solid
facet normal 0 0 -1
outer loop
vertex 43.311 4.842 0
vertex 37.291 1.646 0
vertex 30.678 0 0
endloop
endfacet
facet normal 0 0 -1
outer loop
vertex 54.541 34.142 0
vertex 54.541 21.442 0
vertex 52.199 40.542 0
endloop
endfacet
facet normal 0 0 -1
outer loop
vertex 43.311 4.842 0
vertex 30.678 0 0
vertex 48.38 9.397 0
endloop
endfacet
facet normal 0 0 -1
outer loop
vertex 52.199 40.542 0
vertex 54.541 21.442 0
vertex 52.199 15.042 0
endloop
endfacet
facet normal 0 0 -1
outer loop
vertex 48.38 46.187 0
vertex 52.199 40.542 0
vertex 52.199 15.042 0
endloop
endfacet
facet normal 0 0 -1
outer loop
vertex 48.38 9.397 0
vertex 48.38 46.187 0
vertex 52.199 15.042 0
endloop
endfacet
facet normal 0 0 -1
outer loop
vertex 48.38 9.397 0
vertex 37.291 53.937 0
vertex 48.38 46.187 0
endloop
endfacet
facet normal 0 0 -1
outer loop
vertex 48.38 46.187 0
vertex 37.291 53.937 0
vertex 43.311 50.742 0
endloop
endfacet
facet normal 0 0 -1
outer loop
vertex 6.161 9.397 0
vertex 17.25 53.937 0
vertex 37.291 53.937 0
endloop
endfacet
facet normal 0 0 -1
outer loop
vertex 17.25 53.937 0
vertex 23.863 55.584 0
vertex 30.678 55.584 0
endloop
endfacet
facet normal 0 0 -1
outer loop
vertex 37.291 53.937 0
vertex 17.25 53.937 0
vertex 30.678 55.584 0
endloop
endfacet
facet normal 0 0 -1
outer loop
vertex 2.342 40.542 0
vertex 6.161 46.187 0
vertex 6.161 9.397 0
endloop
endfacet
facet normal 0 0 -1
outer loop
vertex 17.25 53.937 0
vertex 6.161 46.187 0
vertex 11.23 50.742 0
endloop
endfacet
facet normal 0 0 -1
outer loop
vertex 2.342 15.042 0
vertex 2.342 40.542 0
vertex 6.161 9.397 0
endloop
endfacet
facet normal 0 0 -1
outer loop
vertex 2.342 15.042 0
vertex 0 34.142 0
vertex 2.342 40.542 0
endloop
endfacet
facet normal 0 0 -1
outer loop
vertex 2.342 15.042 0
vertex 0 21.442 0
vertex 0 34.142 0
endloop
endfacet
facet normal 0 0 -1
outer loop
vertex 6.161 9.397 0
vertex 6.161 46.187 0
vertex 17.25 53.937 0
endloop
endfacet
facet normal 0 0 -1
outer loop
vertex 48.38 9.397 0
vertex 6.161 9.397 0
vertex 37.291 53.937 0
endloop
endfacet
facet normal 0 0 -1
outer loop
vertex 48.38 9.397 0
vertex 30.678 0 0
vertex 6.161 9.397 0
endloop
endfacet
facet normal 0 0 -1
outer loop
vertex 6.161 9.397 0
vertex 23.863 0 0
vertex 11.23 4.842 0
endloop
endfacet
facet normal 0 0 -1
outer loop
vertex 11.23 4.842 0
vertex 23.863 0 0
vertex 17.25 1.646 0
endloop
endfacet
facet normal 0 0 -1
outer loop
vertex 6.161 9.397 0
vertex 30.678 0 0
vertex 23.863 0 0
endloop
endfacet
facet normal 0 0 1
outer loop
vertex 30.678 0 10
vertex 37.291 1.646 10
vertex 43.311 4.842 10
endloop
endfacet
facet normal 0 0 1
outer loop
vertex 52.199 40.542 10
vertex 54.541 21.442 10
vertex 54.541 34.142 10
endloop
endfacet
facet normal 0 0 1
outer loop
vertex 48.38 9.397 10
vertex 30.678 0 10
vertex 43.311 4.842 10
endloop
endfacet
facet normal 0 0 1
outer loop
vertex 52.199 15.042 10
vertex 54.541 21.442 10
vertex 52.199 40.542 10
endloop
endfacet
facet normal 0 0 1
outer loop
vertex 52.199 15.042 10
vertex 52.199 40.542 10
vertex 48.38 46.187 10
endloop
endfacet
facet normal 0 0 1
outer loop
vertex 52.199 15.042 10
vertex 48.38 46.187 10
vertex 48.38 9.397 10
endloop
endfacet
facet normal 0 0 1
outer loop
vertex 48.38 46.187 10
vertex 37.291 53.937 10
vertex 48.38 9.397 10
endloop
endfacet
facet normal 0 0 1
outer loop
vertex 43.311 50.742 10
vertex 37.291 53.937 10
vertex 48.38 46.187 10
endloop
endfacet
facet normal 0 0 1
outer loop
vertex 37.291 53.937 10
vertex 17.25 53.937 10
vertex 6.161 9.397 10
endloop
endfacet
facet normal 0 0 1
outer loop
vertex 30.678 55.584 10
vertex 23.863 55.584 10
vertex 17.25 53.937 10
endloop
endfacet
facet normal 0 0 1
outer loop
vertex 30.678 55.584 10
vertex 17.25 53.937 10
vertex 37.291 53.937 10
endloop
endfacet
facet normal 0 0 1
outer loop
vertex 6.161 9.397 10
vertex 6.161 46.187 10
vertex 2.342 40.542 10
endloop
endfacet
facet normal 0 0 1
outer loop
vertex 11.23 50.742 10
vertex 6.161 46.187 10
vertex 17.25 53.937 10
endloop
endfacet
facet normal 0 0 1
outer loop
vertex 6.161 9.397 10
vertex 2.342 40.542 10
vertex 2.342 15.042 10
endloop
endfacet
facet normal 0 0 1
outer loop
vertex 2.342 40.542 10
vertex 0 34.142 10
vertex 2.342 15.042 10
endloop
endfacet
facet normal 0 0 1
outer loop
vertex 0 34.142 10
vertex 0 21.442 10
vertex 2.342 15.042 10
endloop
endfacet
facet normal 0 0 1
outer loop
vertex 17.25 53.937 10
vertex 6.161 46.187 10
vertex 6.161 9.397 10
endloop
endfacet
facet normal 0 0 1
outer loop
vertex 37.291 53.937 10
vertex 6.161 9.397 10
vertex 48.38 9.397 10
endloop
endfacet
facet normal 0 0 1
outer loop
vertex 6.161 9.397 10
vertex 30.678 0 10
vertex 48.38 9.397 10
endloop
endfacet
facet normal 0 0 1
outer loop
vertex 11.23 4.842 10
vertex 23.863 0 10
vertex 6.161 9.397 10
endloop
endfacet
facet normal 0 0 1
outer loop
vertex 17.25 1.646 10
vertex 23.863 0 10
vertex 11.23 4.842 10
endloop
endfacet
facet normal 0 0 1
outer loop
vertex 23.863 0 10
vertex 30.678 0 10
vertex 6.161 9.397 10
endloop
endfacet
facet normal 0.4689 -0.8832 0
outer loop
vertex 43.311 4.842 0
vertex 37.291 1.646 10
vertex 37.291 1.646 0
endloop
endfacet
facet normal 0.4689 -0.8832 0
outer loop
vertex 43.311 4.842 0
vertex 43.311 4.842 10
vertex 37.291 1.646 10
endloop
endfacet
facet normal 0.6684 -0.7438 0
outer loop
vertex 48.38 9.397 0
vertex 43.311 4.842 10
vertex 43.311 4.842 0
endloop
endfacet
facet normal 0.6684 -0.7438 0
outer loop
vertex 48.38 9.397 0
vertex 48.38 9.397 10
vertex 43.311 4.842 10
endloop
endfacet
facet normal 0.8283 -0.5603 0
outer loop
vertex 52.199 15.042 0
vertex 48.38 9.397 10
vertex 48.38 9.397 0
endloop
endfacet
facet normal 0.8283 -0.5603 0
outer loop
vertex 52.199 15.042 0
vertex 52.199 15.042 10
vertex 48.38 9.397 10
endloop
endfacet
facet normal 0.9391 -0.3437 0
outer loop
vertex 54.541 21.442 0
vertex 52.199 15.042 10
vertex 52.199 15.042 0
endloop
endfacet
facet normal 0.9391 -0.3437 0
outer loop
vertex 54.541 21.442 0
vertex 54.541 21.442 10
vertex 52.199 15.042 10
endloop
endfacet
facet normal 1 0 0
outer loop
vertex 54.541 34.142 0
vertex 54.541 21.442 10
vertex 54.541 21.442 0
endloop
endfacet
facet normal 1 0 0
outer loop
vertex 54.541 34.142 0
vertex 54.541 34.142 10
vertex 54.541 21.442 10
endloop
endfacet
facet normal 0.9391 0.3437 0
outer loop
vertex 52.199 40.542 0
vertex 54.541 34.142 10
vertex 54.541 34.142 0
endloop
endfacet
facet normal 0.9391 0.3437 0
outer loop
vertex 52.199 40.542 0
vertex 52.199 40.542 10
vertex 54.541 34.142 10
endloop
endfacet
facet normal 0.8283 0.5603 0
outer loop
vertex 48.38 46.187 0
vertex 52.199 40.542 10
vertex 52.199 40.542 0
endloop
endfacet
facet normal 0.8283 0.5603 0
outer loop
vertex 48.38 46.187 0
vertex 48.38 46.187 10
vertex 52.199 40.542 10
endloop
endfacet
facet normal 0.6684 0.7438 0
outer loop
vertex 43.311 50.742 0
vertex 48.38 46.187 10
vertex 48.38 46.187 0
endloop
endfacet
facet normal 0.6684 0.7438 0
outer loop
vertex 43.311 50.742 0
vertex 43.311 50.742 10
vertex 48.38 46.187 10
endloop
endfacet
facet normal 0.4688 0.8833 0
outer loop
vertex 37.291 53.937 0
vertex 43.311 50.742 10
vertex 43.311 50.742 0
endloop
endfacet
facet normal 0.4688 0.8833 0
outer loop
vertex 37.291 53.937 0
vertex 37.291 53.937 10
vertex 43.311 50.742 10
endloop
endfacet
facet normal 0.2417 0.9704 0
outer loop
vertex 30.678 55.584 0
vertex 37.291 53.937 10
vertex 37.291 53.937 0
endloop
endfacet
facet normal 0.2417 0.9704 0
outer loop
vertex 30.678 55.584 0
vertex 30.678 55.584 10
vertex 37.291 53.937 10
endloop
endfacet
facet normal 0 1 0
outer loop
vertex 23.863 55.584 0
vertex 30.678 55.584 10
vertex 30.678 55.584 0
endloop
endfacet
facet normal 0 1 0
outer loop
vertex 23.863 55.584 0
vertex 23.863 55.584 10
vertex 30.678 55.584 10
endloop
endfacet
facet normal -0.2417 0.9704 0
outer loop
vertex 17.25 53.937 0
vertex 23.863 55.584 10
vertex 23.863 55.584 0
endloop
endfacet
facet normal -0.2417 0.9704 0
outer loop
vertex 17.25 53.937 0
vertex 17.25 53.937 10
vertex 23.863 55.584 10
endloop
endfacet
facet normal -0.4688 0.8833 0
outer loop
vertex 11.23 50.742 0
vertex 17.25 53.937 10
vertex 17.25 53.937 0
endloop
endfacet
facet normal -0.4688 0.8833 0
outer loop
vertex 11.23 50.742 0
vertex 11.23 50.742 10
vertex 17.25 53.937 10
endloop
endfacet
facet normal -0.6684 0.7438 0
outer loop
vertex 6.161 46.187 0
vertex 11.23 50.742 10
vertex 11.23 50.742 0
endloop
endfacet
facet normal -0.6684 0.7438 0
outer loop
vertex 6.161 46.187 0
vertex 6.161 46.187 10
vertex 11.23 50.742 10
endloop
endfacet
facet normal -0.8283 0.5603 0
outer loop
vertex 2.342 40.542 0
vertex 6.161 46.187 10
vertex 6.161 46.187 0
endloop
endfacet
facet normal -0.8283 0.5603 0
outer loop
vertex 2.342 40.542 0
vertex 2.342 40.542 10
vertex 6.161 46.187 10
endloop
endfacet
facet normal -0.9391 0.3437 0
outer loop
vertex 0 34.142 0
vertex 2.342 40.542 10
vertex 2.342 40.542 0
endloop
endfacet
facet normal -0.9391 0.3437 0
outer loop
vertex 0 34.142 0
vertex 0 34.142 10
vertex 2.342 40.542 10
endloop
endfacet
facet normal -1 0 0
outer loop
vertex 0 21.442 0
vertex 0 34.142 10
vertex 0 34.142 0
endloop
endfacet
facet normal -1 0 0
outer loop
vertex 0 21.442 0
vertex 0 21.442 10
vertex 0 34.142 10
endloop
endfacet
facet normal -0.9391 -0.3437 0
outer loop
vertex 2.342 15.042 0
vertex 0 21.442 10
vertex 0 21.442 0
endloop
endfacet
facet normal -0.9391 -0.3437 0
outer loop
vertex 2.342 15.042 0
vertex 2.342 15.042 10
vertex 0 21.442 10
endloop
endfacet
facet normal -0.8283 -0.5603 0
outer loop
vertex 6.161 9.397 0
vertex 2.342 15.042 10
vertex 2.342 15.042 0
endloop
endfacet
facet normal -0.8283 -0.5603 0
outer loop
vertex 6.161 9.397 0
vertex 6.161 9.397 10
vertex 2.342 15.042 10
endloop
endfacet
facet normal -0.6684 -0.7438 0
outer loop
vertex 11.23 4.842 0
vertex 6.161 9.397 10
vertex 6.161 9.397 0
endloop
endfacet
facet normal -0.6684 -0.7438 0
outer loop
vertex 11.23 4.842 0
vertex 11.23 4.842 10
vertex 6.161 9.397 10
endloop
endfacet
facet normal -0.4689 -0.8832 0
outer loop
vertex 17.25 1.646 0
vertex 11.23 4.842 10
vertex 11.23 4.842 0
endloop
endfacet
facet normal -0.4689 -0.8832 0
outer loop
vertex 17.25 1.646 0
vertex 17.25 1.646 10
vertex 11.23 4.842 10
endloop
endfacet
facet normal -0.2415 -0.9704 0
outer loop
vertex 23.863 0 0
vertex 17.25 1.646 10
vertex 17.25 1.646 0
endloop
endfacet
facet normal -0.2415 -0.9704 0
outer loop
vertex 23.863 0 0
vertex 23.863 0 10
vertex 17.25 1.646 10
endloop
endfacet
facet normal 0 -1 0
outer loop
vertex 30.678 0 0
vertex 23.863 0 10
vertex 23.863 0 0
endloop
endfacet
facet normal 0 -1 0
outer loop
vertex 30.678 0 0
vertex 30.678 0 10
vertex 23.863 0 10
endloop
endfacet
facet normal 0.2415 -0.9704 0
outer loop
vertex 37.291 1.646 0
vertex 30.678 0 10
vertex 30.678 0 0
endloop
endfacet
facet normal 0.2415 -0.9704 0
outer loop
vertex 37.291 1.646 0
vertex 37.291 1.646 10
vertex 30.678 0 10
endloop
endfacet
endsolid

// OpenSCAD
$fn = 32;

// ----------------------------------------------------------------------
// Flat adaptor: double_d, 10 mm thick
// ----------------------------------------------------------------------

// --- parameters (mm) ---
profile_height = 10;      // extrusion height
profile_points = 24;      // points of the closed outline

profile = [[54.541, 34.142], [52.199, 40.542], [48.38, 46.187], [43.311, 50.742], [37.291, 53.937], [30.678, 55.584], [23.863, 55.584], [17.25, 53.937], [11.23, 50.742], [6.161, 46.187], [2.342, 40.542], [0, 34.142], [0, 21.442], [2.342, 15.042], [6.161, 9.397], [11.23, 4.842], [17.25, 1.646], [23.863, 0], [30.678, 0], [37.291, 1.646], [43.311, 4.842], [48.38, 9.397], [52.199, 15.042], [54.541, 21.442]];  // single closed polygon, 24 points, counter clockwise

// --- the one profile operation ---
linear_extrude(height = profile_height) polygon(points = profile);
